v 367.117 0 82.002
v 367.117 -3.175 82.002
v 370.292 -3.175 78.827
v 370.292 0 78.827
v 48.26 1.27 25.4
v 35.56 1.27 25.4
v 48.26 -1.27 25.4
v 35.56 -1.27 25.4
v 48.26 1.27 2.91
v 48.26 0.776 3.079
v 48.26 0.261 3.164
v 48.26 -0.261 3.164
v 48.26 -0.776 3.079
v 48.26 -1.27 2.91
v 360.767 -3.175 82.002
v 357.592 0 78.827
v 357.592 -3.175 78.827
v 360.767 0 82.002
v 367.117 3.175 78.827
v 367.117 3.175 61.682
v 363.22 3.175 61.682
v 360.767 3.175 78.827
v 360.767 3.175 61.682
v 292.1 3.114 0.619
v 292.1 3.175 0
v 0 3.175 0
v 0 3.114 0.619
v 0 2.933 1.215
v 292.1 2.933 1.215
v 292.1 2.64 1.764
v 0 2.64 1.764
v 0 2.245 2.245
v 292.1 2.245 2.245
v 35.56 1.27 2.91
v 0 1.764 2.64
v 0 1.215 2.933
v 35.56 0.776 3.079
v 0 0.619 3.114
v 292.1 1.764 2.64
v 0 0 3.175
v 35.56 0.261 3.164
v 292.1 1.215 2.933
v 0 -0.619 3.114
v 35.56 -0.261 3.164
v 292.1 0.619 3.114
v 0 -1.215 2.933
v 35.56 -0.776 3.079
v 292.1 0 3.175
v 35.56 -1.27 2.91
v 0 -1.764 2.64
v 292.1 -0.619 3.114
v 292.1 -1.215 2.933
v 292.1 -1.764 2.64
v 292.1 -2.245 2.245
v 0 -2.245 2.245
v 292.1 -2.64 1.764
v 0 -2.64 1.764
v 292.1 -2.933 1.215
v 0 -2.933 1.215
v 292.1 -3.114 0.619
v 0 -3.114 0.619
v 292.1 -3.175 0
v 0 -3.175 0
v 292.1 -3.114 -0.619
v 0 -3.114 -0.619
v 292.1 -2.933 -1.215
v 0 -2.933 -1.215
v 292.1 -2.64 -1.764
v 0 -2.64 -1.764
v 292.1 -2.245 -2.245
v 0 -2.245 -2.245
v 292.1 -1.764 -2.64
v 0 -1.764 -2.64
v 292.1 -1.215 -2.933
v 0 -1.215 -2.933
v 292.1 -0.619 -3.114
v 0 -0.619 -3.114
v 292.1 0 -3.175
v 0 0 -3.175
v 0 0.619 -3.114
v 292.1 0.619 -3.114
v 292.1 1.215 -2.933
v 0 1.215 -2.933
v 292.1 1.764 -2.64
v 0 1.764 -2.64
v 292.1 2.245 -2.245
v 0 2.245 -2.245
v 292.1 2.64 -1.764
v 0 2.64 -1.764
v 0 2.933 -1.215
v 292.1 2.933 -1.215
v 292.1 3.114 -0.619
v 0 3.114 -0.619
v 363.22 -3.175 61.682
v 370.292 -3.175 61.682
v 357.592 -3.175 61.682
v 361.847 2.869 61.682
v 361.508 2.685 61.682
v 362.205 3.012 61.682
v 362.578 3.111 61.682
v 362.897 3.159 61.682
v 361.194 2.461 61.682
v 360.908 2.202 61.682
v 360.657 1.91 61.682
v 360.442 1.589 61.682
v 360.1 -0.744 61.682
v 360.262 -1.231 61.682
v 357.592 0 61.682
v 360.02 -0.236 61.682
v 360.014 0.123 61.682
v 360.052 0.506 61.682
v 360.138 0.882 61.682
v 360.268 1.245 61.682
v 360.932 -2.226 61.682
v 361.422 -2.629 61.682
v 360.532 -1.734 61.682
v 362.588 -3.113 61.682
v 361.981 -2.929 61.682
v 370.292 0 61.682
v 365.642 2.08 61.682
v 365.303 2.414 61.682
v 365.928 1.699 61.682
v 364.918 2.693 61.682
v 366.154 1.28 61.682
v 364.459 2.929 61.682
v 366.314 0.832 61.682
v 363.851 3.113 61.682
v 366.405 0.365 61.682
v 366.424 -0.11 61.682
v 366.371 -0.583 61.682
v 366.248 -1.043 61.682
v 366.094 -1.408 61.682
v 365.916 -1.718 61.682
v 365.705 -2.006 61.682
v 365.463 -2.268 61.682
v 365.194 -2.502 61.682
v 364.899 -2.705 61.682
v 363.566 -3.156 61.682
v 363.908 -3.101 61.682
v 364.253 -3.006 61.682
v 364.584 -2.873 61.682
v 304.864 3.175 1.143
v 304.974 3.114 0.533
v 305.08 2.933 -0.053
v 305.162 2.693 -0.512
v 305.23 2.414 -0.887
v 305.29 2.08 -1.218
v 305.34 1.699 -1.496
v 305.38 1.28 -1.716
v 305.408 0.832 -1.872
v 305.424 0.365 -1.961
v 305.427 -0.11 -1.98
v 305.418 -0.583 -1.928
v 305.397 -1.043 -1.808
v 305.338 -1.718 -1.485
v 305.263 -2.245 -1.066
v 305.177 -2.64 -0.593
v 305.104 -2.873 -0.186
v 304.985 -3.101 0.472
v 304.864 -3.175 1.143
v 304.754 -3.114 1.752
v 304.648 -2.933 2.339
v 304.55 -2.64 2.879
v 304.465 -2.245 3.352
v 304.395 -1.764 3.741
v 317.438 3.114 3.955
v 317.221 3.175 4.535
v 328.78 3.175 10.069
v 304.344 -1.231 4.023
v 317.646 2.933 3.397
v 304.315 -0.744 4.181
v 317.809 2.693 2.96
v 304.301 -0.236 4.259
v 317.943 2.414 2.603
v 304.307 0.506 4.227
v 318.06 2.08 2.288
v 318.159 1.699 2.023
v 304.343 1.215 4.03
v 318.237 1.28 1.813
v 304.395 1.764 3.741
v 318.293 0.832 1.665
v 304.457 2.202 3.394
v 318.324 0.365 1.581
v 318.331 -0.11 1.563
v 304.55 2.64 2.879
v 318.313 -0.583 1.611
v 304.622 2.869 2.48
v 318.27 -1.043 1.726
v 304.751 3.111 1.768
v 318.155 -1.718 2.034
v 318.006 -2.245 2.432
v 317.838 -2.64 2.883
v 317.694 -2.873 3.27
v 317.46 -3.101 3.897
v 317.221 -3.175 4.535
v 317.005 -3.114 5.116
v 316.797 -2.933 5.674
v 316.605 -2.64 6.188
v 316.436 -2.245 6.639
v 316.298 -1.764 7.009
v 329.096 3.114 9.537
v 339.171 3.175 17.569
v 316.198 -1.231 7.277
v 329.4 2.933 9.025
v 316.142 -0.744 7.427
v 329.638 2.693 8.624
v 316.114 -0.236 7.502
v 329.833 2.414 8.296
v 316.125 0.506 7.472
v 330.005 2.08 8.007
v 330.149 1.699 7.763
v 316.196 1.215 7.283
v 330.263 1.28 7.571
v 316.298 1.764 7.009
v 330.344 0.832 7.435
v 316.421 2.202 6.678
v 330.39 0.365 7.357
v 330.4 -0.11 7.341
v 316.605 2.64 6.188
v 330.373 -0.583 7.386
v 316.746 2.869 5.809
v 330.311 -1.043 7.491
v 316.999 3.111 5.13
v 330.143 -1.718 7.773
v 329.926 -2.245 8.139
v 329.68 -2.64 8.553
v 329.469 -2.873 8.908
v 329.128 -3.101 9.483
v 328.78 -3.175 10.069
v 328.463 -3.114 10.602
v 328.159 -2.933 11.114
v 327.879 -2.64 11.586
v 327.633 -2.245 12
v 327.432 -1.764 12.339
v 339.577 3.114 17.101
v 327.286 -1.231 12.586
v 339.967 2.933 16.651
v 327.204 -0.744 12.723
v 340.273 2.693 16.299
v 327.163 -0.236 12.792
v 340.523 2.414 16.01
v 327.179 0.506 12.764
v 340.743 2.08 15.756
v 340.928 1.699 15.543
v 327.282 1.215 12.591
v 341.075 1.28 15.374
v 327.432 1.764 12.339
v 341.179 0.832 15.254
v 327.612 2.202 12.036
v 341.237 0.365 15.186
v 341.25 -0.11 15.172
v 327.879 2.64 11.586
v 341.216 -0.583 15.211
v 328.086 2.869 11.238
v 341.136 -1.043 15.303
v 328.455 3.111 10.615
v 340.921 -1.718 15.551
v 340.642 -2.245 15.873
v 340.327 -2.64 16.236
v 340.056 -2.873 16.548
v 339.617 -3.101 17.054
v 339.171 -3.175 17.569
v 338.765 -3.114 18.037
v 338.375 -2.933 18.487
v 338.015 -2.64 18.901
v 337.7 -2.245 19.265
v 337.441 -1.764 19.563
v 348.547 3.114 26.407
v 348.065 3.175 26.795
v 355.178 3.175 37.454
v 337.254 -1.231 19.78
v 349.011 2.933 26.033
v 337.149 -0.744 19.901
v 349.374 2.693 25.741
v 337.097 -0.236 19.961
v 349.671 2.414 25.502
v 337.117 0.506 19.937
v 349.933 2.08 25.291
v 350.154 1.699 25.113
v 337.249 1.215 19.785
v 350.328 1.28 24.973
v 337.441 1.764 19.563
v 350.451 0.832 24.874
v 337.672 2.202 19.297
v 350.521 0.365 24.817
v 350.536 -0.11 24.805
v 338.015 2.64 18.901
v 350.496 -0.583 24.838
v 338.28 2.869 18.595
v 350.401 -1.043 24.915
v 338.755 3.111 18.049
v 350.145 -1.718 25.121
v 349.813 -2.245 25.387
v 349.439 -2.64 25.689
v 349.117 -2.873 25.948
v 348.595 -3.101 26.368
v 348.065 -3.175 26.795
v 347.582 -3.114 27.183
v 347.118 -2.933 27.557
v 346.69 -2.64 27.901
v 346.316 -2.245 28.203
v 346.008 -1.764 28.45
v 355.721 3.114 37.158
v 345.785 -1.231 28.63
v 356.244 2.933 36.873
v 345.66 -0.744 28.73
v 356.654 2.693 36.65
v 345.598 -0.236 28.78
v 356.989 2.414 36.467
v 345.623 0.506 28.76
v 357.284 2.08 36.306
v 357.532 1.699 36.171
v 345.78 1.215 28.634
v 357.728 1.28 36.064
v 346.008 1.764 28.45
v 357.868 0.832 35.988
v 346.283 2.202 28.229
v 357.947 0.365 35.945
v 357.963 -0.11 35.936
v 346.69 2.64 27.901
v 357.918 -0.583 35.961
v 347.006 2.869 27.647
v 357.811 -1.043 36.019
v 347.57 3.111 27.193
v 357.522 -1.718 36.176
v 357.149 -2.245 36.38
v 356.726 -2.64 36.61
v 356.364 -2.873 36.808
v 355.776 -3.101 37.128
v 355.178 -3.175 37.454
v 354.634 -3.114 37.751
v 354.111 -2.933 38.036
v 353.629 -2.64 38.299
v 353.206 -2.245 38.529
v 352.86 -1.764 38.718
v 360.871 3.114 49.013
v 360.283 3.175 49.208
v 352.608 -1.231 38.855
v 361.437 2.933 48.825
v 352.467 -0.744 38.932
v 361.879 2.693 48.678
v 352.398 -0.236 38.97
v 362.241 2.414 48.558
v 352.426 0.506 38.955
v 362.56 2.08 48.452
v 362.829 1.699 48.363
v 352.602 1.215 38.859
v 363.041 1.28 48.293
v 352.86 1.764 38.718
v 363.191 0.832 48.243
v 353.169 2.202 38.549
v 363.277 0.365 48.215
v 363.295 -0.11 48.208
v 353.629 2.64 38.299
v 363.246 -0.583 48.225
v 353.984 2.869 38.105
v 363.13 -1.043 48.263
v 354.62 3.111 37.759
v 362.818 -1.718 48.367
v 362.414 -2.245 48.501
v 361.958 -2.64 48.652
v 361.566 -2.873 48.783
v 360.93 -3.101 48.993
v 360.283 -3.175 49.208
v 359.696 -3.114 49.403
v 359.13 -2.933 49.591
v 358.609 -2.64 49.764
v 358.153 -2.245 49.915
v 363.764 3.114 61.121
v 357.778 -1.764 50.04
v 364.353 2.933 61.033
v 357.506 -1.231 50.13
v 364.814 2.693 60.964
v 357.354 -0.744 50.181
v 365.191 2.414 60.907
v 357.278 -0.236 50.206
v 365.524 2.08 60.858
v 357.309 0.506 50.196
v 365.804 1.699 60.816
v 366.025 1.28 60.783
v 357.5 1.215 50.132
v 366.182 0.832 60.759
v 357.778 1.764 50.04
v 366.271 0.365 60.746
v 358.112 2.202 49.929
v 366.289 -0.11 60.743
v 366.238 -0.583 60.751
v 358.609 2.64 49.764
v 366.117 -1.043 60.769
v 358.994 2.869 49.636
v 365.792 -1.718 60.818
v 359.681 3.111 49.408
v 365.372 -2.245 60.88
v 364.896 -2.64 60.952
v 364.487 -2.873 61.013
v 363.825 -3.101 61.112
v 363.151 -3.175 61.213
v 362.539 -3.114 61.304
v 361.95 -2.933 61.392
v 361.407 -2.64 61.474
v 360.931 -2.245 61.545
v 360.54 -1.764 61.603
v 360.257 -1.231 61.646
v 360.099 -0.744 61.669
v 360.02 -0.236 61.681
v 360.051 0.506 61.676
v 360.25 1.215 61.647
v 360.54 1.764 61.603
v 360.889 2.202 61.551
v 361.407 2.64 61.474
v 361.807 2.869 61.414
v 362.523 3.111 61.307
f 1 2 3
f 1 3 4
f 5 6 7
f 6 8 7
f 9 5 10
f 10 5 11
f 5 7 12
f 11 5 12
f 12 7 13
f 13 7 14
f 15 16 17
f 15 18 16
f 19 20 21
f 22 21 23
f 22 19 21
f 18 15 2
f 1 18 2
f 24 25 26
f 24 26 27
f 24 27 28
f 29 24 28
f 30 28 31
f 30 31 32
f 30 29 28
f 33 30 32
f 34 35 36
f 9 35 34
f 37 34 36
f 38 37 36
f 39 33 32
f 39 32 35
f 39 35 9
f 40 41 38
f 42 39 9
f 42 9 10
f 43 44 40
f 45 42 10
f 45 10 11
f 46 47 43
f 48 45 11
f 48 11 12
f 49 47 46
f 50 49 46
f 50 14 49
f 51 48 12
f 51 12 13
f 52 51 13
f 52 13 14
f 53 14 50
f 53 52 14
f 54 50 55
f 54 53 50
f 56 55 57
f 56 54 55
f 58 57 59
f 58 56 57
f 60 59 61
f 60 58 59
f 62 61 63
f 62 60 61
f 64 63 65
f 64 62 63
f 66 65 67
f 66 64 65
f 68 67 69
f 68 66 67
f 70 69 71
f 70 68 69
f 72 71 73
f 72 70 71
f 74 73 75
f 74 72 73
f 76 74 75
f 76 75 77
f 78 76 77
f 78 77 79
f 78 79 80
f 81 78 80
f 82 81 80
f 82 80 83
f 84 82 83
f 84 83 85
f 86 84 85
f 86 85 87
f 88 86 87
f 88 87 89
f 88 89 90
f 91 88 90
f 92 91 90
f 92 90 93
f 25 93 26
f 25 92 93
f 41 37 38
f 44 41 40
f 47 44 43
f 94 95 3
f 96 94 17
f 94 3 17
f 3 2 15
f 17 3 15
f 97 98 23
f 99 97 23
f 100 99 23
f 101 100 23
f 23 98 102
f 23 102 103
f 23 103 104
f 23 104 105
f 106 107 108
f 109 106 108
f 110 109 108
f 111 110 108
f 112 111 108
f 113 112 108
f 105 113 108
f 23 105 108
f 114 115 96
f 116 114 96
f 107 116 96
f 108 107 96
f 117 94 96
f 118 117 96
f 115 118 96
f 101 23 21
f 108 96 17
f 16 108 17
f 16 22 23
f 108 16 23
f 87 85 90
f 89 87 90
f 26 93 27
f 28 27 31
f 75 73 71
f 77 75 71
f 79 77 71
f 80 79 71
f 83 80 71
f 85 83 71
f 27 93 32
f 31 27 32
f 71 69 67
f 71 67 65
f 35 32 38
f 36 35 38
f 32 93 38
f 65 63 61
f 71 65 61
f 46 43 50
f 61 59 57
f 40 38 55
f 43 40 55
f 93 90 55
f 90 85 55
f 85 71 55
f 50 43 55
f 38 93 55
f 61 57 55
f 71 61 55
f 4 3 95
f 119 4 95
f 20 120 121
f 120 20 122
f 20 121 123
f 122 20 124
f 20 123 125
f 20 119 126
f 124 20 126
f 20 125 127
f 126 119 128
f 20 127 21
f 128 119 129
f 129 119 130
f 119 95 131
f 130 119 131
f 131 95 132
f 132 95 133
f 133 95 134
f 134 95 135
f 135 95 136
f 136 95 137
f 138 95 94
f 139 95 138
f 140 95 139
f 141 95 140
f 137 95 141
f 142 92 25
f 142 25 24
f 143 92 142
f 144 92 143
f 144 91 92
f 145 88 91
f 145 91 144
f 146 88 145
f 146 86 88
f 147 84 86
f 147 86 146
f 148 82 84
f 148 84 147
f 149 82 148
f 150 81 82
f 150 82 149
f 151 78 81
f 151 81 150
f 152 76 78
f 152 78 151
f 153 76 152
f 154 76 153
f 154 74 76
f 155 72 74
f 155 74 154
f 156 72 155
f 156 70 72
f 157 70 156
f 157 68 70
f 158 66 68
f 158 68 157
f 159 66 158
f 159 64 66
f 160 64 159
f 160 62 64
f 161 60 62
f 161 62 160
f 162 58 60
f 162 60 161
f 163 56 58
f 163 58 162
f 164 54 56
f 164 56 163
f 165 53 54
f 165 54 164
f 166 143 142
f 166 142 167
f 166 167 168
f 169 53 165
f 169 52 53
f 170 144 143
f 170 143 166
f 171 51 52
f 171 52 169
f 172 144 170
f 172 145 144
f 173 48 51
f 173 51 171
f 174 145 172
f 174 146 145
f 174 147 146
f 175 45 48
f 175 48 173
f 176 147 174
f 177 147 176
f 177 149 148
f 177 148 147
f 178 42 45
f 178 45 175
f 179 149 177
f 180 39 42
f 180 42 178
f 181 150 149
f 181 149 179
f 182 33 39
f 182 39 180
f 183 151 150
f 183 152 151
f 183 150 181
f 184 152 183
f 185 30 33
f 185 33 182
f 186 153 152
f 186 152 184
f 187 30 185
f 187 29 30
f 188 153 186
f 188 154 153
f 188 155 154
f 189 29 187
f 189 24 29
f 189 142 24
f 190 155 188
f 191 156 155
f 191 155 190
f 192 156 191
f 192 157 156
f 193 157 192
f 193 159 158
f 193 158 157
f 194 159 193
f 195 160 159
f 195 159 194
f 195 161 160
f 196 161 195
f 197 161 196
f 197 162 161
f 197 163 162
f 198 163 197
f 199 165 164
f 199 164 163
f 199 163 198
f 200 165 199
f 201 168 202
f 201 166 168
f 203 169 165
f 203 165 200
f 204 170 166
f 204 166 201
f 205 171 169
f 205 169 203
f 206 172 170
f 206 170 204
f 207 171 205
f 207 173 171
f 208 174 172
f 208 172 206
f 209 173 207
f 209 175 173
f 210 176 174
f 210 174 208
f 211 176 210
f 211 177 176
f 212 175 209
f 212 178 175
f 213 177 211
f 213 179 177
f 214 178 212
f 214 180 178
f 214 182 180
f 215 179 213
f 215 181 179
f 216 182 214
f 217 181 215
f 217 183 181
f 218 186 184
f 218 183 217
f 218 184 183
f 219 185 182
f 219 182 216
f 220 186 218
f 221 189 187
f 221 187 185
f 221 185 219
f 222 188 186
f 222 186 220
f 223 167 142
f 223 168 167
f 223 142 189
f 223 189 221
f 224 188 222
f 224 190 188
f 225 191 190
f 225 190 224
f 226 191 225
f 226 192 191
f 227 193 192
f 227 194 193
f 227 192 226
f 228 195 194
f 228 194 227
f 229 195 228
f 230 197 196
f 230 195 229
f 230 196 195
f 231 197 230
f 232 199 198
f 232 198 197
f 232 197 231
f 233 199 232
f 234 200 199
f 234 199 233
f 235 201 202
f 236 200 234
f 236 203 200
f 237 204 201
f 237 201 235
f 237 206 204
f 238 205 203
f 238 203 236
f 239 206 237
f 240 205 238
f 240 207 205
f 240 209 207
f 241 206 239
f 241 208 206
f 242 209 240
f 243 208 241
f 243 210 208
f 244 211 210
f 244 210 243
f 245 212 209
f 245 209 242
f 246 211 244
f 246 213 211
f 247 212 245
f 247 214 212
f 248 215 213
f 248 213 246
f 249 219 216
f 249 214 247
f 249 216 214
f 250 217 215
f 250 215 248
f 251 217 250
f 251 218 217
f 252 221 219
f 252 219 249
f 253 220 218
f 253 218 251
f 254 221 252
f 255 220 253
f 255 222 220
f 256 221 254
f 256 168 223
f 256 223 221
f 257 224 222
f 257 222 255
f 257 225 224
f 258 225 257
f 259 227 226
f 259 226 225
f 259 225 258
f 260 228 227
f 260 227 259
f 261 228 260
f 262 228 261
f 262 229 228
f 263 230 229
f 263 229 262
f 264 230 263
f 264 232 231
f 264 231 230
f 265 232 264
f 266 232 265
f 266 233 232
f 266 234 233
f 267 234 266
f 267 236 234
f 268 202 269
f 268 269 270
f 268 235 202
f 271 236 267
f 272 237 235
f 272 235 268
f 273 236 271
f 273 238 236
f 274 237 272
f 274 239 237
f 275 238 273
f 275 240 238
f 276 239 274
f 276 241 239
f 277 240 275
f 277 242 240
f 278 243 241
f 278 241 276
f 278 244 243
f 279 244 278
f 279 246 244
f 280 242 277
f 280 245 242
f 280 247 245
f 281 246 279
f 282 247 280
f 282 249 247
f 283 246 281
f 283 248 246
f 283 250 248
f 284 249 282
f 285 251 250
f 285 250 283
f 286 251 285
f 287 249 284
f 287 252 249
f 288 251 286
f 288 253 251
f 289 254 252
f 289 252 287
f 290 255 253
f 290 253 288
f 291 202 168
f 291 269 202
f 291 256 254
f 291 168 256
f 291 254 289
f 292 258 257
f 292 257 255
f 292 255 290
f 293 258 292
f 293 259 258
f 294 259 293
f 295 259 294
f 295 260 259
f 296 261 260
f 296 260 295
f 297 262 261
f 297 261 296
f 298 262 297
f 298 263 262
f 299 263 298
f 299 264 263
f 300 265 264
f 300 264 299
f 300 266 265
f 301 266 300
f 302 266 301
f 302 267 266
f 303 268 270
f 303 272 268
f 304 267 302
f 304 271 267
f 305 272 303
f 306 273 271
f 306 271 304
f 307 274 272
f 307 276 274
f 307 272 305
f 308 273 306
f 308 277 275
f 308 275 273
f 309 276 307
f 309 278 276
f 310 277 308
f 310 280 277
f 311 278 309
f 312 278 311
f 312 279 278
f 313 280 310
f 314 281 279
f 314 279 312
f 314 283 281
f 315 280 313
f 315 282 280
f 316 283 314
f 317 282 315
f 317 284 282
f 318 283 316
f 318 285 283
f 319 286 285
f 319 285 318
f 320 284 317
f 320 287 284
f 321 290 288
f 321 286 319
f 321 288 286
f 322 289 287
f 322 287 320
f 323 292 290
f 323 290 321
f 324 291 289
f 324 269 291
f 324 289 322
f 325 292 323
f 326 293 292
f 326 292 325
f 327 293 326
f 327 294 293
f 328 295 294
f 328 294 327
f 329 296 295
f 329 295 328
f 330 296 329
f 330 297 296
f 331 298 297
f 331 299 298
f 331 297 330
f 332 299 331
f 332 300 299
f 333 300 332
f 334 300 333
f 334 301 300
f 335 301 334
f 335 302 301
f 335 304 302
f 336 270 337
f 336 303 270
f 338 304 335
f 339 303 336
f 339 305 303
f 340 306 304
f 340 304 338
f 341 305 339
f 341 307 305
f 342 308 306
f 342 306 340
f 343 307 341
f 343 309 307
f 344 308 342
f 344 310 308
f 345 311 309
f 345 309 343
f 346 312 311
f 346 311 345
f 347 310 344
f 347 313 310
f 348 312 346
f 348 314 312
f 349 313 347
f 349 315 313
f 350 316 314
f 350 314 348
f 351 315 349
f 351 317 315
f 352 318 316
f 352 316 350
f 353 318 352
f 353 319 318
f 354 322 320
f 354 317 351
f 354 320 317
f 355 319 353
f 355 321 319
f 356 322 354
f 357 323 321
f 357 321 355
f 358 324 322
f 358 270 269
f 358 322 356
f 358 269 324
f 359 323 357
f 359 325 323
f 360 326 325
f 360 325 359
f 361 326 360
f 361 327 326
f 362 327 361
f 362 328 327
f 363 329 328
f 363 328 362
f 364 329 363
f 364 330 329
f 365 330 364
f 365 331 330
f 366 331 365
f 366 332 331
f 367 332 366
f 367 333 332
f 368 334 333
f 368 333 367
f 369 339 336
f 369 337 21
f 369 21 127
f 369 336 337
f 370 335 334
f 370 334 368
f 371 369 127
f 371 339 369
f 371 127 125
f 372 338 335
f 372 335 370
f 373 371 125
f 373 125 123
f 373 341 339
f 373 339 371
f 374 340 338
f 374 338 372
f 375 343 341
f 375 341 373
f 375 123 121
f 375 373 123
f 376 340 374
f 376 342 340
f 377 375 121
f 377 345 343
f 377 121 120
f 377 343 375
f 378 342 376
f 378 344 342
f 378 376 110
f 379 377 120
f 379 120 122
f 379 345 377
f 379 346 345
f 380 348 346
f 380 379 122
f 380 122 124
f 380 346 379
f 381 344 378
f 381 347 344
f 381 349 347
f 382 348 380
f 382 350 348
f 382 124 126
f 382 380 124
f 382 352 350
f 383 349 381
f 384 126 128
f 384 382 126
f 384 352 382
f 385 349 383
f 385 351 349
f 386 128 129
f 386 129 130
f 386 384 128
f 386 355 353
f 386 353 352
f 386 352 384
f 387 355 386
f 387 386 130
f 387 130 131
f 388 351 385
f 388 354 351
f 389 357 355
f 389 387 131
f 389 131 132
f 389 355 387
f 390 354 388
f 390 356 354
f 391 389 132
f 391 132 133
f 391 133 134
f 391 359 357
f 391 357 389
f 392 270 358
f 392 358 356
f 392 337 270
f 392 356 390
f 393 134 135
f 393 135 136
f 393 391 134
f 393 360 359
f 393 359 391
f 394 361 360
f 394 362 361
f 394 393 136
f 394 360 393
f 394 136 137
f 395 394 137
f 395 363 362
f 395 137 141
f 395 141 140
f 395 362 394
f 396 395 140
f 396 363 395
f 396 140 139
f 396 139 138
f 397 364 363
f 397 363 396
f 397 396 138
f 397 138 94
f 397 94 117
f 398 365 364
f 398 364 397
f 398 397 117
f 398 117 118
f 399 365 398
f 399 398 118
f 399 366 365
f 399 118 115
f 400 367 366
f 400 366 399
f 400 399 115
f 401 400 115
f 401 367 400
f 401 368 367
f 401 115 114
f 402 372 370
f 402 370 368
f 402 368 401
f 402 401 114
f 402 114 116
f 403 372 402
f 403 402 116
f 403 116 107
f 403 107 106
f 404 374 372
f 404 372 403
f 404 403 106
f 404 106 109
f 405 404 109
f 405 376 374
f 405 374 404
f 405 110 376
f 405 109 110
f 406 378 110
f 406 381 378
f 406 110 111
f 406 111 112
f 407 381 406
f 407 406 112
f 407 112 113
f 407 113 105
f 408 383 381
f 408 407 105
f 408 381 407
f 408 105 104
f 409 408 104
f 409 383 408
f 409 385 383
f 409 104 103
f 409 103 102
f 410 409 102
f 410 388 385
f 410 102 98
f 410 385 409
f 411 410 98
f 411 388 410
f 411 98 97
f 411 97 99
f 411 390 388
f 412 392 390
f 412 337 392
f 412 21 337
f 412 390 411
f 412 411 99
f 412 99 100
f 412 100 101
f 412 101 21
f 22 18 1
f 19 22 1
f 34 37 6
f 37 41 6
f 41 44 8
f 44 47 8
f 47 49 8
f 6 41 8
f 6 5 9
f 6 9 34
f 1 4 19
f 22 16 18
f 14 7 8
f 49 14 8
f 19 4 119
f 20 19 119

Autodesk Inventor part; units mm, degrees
ref_plane "YZ Plane" through (0, 0, 0) normal (1, 0, 0) x (0, 1, 0)
ref_plane "XZ Plane" through (0, 0, 0) normal (0, 1, 0) x (-1, 0, 0)
ref_plane "XY Plane" through (0, 0, 0) normal (0, 0, 1) x (1, 0, 0)
sketch "Sketch1" plane through (0, 0, 0) normal (1, 0, 0) x (0, 1, 0)
  circle A0 centre (0, 0) radius 3.175
  dimension "d0" = 6.35
sketch "Sketch2" plane through (0, 0, 0) normal (0, 1, 0) x (-1, 0, 0)
  line L0 (0, 0) -> (-292.1, 0)
  arc A0 (-363.942, 71.842) -> (-292.1, 0) centre (-292.1, 71.842) ccw
  line L1 (-292.1, 0) -> (-363.942, 71.842) construction
  line L2 (-292.1, 0) -> (-190.5, 0) construction
  dimension "d1" = 292.1
  dimension "d2" = 101.6
  dimension "d3" = 135
sweep "Sweep1" add profiles "Sketch1" path "Sketch2"
sketch "Sketch3" plane through (0, 0, 0) normal (0, 1, 0) x (-1, 0, 0)
  line L0 (-357.592, 82.002) -> (-370.292, 82.002)
  line L1 (-370.292, 82.002) -> (-370.292, 61.682)
  line L2 (-370.292, 61.682) -> (-357.592, 61.682)
  line L3 (-357.592, 61.682) -> (-357.592, 82.002)
  line L4 (-360.767, 71.842) -> (-367.117, 71.842) projected
  line L5 (-357.592, 82.002) -> (-370.292, 61.682) construction
  line L6 (-370.292, 82.002) -> (-357.592, 61.682) construction
  point P0 (0, 0)
  point P1 (-363.942, 71.842)
  dimension "d6" = 12.7
  dimension "d7" = 20.32
extrude "Extrusion1" add sketch "Sketch3" along normal mid plane 6.35
chamfer "Chamfer1" distance 3.175 angle 45 5 edges at (370.292, 0, 82.002) (357.592, 0, 82.002) (357.592, 3.175, 71.842) (370.292, 3.175, 71.842) (363.942, 3.175, 82.002)
sketch "Sketch4" plane through (0, 0, 0) normal (0, 1, 0) x (-1, 0, 0)
  line L0 (0, 0) -> (-2.54, 0)
  line L1 (-2.54, 0) -> (-81.28, 0)
  line L2 (-35.56, 25.4) -> (-48.26, 25.4)
  line L3 (-48.26, 25.4) -> (-48.26, -25.4)
  line L4 (-48.26, -25.4) -> (-35.56, -25.4)
  line L5 (-35.56, -25.4) -> (-35.56, 25.4)
  line L6 (-35.56, 25.4) -> (-48.26, -25.4) construction
  line L7 (-48.26, 25.4) -> (-35.56, -25.4) construction
  line L8 (-35.56, 0) -> (-48.26, 0)
  point P0 (-41.91, 0)
  point P1 (-48.26, 0)
  point P2 (-35.56, 0)
  dimension "d13" = 2.54
  dimension "d14" = 78.74
  dimension "d15" = 12.7
  dimension "d16" = 50.8
extrude "Extrusion2" add sketch "Sketch4" along normal mid plane 2.54 contours L1 L3 L2 L5
properties part number "Height adjust(H)"
